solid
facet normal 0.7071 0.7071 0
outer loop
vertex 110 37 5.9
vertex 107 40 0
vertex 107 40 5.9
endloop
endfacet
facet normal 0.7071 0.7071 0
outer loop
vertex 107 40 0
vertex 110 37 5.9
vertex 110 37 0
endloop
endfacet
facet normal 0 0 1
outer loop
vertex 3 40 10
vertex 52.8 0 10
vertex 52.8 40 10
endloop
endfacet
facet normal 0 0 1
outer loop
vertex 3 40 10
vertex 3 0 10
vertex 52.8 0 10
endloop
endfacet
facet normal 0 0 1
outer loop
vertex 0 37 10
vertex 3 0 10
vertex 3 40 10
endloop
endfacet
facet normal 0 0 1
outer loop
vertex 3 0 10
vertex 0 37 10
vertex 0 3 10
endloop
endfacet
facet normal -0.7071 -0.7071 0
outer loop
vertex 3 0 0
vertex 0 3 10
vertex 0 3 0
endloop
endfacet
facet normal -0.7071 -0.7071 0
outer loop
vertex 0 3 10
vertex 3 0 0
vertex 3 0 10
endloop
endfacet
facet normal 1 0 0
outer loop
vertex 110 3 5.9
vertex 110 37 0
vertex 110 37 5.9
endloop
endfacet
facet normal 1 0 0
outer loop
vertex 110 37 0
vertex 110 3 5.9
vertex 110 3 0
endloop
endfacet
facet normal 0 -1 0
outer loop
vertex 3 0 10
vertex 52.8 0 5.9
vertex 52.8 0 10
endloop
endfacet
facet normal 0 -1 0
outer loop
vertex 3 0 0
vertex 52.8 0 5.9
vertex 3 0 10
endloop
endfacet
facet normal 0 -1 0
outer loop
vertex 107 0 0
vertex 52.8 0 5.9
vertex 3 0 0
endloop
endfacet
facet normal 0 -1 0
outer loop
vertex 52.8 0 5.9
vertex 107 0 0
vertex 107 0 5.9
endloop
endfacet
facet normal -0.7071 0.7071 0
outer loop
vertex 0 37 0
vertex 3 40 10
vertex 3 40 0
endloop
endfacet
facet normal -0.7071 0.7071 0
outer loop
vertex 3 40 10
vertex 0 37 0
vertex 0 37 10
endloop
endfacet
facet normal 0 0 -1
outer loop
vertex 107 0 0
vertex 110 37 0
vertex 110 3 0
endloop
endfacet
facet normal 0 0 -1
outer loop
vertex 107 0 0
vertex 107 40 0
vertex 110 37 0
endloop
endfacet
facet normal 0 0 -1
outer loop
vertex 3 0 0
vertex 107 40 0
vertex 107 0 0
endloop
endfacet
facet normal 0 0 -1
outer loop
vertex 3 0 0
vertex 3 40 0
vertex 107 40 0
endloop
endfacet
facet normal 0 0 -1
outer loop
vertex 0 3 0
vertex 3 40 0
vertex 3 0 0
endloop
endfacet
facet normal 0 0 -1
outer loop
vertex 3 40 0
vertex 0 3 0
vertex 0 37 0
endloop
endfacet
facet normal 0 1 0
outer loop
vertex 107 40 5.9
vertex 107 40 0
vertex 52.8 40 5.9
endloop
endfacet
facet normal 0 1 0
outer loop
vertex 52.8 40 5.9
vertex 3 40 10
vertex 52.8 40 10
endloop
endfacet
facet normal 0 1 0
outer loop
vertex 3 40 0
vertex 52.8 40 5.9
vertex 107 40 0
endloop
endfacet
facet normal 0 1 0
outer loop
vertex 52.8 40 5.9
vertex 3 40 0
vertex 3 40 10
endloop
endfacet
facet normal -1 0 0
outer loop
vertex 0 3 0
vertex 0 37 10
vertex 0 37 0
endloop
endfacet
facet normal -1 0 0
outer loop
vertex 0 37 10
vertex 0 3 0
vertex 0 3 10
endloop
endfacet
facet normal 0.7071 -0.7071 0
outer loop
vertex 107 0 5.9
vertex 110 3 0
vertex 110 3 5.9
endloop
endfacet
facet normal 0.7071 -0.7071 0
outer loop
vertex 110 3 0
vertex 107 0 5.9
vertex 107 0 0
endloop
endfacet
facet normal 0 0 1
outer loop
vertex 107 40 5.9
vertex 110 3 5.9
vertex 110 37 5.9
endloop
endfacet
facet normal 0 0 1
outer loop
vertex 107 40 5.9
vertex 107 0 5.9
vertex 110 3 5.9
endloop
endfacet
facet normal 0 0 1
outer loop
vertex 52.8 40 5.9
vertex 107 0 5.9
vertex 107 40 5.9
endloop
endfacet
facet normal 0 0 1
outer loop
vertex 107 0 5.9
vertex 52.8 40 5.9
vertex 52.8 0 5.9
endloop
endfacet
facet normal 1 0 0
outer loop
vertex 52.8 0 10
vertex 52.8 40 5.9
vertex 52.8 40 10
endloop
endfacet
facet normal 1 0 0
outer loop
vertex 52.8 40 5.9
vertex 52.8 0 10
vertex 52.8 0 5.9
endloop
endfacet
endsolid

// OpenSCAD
$fn = 32;

// ----------------------------------------------------------------------
// Stepped bar: endstep, 110 x 40 x 10/5.9 mm
// ----------------------------------------------------------------------

// --- parameters (mm) ---
bar_l = 110;              // bar length, X
bar_w = 40;               // bar width, Y
plate_t = 10;             // thickness of the thick zone, Z
thin_t = 5.9;             // thickness of the thin zone
corner_c = 3;             // corner chamfer of the bar
step_cut = 4.1;           // material removed from the thin zone
step_x = 52.8;            // step position from the left end
depth_1 = 4.1;            // depth of cut 1 from the top face

profile = [[3, 0], [107, 0], [110, 3], [110, 37], [107, 40], [3, 40], [0, 37], [0, 3]];  // primary outline, 8 points, counter clockwise
void_1 = [[52.8, -1], [111, -1], [111, 41], [52.8, 41]];  // thin zone beyond the step, 4 points

// --- the one profile operation ---
difference() {
  linear_extrude(height = plate_t) polygon(points = profile);
  translate([0, 0, plate_t - depth_1])
    linear_extrude(height = depth_1 + 1) polygon(points = void_1);
}
